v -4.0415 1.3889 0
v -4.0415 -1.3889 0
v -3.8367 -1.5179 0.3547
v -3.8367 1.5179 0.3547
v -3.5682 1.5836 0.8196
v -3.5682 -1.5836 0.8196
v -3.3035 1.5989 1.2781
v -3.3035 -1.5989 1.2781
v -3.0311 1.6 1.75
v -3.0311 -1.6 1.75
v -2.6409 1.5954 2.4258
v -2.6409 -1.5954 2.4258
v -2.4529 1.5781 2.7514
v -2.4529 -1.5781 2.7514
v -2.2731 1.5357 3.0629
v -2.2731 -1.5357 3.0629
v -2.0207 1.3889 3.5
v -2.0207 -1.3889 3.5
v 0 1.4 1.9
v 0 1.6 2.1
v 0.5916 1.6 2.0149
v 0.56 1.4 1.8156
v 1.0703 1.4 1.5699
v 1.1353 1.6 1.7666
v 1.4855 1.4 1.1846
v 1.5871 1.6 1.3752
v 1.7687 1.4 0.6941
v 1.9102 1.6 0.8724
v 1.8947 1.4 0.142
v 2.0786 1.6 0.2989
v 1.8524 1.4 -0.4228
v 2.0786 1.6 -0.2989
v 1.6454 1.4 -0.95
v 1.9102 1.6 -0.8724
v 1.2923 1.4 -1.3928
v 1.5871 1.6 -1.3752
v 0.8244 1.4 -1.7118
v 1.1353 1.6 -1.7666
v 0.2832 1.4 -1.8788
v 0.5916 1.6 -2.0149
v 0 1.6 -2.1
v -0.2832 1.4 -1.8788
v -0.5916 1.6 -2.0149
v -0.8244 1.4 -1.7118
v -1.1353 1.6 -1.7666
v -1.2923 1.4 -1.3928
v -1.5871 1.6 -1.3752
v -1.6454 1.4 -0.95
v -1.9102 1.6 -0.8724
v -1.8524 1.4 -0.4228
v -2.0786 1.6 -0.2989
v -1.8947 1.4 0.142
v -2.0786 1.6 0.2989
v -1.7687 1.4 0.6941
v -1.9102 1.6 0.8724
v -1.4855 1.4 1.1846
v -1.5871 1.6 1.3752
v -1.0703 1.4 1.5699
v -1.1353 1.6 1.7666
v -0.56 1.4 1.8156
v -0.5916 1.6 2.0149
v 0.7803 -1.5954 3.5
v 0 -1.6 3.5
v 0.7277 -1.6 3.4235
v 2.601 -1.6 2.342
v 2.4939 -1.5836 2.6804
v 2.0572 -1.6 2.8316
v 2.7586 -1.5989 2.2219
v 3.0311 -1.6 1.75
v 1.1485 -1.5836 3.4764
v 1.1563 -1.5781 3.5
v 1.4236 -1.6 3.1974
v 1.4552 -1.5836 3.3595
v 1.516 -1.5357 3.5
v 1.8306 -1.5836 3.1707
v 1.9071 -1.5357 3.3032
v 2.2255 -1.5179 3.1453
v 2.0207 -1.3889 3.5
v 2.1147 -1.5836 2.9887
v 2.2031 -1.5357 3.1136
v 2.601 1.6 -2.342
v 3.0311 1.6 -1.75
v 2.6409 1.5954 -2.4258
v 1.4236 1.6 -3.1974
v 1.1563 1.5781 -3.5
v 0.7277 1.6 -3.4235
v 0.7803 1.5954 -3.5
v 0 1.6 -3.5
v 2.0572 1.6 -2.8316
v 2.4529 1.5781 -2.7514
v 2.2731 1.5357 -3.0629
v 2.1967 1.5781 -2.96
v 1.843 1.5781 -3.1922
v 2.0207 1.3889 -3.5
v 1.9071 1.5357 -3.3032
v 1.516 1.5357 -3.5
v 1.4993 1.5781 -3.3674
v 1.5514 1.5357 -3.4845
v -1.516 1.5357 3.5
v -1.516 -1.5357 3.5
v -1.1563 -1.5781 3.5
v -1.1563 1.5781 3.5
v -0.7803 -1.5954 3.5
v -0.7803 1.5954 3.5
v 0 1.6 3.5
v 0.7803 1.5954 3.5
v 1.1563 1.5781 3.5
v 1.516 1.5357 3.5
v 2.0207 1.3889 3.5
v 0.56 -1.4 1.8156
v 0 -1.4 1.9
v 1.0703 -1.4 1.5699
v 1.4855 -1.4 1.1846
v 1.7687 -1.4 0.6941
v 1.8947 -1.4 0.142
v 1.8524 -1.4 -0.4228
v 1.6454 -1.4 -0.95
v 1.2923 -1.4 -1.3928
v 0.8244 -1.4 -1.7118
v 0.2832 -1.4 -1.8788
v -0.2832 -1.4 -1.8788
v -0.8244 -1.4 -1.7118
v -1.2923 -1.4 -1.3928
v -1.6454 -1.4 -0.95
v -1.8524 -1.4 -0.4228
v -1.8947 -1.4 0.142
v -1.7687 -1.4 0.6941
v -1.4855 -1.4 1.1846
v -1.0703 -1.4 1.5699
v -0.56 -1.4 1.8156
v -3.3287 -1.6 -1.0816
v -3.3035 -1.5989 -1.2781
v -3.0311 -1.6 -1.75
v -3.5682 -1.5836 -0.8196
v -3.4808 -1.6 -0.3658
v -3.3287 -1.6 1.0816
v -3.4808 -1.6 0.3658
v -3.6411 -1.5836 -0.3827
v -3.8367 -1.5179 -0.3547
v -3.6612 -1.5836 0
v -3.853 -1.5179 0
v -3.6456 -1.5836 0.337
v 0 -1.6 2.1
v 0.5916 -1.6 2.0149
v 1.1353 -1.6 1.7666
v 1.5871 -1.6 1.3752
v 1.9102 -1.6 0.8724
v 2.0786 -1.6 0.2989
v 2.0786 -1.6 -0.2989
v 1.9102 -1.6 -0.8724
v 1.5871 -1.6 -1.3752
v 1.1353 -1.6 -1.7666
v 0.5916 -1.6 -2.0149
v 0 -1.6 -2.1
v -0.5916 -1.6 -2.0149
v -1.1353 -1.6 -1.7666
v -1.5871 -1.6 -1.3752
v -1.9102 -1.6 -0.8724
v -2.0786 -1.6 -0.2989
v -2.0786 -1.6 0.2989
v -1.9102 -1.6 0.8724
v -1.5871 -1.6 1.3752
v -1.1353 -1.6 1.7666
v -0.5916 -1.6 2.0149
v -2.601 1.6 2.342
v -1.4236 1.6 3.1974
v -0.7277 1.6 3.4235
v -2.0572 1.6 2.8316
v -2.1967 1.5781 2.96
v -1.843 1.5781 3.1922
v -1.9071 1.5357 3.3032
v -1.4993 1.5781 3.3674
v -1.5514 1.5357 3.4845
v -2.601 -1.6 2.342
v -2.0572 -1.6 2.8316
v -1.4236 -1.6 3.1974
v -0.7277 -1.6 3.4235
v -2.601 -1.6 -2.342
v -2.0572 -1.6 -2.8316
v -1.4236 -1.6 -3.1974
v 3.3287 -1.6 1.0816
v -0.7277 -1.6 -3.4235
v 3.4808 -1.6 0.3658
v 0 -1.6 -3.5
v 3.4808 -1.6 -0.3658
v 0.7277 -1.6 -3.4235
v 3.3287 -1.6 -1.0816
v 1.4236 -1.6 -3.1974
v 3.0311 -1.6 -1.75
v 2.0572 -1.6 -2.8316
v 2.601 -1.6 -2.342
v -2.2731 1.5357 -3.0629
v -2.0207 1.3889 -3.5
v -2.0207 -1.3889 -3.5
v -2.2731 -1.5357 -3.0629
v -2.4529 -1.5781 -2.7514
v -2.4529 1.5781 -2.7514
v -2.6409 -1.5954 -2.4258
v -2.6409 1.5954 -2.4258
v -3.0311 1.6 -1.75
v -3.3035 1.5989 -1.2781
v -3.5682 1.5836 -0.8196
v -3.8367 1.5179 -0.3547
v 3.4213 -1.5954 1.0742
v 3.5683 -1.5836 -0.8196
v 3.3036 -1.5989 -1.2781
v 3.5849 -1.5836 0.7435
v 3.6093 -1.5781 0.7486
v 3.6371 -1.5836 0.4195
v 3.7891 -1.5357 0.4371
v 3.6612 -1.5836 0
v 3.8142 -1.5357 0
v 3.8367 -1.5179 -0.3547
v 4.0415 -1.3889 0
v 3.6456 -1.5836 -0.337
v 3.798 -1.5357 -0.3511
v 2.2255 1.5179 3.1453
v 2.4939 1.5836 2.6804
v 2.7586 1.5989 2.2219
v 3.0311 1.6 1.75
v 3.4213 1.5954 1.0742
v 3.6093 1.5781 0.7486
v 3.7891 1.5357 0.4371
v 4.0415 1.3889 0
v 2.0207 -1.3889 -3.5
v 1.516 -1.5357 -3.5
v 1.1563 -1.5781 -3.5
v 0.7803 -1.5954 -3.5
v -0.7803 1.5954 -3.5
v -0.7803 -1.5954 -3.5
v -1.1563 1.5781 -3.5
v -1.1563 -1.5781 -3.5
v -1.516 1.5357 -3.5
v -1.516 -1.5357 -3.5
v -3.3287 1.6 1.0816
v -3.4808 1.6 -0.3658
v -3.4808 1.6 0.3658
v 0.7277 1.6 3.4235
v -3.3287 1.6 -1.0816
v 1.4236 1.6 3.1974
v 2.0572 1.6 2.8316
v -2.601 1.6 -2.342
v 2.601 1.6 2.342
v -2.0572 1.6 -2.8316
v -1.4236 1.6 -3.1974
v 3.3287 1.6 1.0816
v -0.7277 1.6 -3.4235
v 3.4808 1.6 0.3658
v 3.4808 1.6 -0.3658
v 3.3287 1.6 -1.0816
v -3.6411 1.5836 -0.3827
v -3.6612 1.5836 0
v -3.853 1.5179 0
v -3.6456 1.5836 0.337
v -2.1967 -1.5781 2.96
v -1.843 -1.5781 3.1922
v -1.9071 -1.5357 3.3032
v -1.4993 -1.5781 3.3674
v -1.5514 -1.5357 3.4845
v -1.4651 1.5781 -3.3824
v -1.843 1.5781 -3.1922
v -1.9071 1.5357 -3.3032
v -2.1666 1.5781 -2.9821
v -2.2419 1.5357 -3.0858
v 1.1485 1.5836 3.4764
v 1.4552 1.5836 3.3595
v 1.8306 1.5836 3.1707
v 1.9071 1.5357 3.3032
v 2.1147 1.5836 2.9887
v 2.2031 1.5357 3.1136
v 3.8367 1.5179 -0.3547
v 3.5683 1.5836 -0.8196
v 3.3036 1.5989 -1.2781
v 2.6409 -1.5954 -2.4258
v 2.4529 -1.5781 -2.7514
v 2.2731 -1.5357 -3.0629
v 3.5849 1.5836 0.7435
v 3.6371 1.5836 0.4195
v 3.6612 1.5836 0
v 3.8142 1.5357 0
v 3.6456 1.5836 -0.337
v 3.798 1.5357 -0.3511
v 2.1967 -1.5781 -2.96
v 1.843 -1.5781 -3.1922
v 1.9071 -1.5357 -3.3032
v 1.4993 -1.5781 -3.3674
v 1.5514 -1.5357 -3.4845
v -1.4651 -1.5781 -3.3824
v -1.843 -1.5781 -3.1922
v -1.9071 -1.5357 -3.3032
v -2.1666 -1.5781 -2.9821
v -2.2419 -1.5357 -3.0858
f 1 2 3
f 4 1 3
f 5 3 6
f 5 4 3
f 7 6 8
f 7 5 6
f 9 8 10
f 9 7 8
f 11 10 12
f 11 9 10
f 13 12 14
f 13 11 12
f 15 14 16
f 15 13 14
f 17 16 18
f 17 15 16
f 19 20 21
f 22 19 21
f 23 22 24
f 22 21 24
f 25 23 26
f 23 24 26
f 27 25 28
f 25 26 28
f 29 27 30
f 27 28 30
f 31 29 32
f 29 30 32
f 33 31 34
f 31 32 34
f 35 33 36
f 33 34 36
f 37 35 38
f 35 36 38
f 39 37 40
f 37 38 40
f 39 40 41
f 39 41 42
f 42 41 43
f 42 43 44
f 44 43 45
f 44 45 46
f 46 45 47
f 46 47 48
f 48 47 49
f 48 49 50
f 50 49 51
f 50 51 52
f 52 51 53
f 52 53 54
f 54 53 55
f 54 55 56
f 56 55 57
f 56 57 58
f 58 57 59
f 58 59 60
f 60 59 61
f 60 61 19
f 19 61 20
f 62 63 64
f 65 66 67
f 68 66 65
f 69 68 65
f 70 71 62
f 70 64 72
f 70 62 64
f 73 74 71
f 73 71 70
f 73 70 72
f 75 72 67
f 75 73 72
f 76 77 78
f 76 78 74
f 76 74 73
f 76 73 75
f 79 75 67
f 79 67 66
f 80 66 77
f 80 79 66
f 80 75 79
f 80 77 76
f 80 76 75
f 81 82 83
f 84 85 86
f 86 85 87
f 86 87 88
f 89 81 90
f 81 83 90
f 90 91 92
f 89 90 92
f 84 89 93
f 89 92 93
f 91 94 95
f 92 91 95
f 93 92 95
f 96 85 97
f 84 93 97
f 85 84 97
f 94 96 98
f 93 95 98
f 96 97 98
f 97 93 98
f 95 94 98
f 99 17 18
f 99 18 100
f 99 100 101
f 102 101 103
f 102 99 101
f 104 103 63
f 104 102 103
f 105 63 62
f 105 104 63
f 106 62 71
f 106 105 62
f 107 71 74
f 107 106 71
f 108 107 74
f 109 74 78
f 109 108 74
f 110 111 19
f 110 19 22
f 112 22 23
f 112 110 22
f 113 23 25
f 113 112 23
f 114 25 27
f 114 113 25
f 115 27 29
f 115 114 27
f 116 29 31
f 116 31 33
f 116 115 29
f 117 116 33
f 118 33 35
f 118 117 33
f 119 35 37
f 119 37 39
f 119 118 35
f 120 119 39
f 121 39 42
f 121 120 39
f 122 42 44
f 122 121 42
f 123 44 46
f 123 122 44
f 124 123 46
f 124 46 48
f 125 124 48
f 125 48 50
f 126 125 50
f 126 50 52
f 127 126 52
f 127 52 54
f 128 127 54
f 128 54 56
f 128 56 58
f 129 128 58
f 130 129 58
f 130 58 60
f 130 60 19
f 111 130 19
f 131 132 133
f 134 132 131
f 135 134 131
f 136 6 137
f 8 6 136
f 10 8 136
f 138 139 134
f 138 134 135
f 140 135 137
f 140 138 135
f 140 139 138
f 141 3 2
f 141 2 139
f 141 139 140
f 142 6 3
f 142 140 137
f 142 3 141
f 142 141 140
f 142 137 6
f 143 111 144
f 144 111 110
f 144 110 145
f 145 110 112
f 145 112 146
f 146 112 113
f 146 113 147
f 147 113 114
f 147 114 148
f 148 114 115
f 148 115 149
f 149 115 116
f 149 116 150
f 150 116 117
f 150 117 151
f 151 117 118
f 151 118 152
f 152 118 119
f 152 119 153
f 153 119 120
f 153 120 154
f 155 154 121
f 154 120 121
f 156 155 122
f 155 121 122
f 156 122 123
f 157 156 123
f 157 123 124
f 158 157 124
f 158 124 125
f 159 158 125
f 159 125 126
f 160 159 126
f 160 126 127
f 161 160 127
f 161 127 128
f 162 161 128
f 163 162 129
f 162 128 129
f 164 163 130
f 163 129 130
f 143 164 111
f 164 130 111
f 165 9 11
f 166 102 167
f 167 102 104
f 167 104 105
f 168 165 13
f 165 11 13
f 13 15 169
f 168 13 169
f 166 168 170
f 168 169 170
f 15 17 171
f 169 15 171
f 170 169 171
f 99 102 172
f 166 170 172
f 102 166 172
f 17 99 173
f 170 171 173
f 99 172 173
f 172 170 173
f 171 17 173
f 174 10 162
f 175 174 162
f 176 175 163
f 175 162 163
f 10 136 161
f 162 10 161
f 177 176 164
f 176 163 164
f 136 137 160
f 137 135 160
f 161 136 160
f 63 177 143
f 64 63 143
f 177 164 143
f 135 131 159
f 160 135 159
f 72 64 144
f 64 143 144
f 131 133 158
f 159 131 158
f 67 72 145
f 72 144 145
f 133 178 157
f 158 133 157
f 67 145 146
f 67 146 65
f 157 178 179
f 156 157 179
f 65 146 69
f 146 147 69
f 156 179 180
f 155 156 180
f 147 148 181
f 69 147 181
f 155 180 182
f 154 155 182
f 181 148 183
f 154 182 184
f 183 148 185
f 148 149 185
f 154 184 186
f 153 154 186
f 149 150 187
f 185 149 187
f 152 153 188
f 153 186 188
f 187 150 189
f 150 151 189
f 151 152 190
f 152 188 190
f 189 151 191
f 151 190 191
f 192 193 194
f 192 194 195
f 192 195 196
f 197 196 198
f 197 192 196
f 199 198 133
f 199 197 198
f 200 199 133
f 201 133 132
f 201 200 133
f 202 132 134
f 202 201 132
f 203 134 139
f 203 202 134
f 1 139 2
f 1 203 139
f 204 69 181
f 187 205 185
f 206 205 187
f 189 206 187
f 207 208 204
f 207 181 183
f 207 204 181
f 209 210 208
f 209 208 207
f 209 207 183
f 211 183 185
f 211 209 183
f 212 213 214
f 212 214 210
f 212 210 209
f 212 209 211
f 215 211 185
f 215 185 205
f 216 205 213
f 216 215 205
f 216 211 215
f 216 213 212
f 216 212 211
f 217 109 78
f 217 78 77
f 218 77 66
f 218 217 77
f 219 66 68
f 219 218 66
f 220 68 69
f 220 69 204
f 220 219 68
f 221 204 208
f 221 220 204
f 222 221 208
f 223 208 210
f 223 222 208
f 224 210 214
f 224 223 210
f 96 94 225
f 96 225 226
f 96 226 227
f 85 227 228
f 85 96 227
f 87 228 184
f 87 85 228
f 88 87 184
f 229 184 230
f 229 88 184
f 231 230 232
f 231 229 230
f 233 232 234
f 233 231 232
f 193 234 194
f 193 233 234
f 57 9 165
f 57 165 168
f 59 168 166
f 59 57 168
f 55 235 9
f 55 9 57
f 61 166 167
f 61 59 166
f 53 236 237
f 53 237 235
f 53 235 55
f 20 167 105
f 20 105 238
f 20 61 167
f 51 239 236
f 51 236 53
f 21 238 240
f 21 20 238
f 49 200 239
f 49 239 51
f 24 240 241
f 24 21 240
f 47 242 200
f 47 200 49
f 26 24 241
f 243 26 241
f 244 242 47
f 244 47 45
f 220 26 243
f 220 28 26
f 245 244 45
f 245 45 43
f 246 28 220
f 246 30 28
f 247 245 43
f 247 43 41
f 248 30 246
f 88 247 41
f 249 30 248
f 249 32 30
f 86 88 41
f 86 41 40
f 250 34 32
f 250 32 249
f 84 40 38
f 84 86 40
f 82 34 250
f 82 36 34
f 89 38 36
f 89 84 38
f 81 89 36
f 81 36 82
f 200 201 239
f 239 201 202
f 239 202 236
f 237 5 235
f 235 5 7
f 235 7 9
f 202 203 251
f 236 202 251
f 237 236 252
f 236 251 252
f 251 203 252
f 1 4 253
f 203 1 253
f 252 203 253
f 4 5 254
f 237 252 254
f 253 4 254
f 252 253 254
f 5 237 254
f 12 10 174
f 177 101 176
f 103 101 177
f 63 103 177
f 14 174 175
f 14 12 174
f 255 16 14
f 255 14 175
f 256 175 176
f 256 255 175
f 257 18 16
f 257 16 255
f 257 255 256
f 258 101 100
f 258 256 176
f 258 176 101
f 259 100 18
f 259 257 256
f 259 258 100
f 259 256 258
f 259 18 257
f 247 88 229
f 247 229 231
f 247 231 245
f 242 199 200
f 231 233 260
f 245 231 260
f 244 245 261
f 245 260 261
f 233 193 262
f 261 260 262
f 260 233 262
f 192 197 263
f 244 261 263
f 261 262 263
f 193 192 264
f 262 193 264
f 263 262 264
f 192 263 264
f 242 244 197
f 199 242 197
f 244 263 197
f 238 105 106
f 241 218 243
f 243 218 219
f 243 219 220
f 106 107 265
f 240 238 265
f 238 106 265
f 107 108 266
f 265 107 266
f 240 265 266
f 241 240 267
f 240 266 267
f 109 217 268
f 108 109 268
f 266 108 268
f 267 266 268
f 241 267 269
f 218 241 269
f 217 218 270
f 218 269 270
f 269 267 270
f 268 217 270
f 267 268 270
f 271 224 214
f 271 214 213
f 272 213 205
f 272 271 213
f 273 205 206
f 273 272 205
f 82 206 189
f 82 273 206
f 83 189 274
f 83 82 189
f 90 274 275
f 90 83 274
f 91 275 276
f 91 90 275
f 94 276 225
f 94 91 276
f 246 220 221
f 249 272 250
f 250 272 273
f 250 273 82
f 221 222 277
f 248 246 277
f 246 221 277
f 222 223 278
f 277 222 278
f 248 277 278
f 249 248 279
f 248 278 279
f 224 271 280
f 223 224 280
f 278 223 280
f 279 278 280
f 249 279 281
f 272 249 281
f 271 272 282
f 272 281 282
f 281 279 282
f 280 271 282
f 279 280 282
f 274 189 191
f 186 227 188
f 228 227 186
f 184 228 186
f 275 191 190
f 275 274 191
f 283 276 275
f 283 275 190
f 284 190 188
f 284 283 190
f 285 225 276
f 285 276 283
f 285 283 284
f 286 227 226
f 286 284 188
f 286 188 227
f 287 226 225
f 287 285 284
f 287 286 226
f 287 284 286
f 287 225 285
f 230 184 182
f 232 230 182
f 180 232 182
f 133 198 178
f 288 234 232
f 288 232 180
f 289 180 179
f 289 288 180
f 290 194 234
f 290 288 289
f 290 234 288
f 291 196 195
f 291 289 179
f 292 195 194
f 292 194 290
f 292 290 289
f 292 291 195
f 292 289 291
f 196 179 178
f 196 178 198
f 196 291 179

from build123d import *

# Parameters (mm, degrees)
SKETCH1_R           = 1.9
BOSS_EXTRUDE1_DEPTH = 1.6
CHAMFER1_SIZE       = 0.2


with BuildPart() as part:
    # Sketch1 → Boss-Extrude1 (new, symmetric)
    with BuildSketch(Plane(origin=(0, 0, 0), x_dir=(1, 0, 0), z_dir=(0, 1, 0))):
        Polygon((4.041451884, 0), (2.020725942, 3.5), (-2.020725942, 3.5), (-4.041451884, 0), (-2.020725942, -3.5), (2.020725942, -3.5), align=None)
        with Locations(Location((0, 0, 0), (0, 0, 270))):
            Circle(SKETCH1_R, mode=Mode.SUBTRACT)
    extrude(amount=BOSS_EXTRUDE1_DEPTH, both=True)

    # Sketch2 → Cut-Revolve1 (revolve, cut)
    with BuildSketch(Plane.XY):
        with BuildLine():
            Line((-4.3, -0.8), (-4.3, -1.6))
            Line((-4.3, -1.6), (-3.5, -1.6))
            ThreePointArc((-3.5, -1.6), (-4.065685425, -1.365685425), (-4.3, -0.8))
        make_face()
    cut_revolve1 = revolve(axis=Axis((0, 0, 0), (0, 1, 0)), mode=Mode.SUBTRACT)

    # Mirror2: Cut-Revolve1 across plane
    add(cut_revolve1.mirror(Plane.ZX), mode=Mode.SUBTRACT)

    # Chamfer1
    chamfer1_edges = [part.edges().sort_by_distance(p)[0] for p in [
        (0, -1.6, -1.9),
        (0, 1.6, -1.9),
    ]]
    chamfer(chamfer1_edges, length=CHAMFER1_SIZE)


solid = part.part
